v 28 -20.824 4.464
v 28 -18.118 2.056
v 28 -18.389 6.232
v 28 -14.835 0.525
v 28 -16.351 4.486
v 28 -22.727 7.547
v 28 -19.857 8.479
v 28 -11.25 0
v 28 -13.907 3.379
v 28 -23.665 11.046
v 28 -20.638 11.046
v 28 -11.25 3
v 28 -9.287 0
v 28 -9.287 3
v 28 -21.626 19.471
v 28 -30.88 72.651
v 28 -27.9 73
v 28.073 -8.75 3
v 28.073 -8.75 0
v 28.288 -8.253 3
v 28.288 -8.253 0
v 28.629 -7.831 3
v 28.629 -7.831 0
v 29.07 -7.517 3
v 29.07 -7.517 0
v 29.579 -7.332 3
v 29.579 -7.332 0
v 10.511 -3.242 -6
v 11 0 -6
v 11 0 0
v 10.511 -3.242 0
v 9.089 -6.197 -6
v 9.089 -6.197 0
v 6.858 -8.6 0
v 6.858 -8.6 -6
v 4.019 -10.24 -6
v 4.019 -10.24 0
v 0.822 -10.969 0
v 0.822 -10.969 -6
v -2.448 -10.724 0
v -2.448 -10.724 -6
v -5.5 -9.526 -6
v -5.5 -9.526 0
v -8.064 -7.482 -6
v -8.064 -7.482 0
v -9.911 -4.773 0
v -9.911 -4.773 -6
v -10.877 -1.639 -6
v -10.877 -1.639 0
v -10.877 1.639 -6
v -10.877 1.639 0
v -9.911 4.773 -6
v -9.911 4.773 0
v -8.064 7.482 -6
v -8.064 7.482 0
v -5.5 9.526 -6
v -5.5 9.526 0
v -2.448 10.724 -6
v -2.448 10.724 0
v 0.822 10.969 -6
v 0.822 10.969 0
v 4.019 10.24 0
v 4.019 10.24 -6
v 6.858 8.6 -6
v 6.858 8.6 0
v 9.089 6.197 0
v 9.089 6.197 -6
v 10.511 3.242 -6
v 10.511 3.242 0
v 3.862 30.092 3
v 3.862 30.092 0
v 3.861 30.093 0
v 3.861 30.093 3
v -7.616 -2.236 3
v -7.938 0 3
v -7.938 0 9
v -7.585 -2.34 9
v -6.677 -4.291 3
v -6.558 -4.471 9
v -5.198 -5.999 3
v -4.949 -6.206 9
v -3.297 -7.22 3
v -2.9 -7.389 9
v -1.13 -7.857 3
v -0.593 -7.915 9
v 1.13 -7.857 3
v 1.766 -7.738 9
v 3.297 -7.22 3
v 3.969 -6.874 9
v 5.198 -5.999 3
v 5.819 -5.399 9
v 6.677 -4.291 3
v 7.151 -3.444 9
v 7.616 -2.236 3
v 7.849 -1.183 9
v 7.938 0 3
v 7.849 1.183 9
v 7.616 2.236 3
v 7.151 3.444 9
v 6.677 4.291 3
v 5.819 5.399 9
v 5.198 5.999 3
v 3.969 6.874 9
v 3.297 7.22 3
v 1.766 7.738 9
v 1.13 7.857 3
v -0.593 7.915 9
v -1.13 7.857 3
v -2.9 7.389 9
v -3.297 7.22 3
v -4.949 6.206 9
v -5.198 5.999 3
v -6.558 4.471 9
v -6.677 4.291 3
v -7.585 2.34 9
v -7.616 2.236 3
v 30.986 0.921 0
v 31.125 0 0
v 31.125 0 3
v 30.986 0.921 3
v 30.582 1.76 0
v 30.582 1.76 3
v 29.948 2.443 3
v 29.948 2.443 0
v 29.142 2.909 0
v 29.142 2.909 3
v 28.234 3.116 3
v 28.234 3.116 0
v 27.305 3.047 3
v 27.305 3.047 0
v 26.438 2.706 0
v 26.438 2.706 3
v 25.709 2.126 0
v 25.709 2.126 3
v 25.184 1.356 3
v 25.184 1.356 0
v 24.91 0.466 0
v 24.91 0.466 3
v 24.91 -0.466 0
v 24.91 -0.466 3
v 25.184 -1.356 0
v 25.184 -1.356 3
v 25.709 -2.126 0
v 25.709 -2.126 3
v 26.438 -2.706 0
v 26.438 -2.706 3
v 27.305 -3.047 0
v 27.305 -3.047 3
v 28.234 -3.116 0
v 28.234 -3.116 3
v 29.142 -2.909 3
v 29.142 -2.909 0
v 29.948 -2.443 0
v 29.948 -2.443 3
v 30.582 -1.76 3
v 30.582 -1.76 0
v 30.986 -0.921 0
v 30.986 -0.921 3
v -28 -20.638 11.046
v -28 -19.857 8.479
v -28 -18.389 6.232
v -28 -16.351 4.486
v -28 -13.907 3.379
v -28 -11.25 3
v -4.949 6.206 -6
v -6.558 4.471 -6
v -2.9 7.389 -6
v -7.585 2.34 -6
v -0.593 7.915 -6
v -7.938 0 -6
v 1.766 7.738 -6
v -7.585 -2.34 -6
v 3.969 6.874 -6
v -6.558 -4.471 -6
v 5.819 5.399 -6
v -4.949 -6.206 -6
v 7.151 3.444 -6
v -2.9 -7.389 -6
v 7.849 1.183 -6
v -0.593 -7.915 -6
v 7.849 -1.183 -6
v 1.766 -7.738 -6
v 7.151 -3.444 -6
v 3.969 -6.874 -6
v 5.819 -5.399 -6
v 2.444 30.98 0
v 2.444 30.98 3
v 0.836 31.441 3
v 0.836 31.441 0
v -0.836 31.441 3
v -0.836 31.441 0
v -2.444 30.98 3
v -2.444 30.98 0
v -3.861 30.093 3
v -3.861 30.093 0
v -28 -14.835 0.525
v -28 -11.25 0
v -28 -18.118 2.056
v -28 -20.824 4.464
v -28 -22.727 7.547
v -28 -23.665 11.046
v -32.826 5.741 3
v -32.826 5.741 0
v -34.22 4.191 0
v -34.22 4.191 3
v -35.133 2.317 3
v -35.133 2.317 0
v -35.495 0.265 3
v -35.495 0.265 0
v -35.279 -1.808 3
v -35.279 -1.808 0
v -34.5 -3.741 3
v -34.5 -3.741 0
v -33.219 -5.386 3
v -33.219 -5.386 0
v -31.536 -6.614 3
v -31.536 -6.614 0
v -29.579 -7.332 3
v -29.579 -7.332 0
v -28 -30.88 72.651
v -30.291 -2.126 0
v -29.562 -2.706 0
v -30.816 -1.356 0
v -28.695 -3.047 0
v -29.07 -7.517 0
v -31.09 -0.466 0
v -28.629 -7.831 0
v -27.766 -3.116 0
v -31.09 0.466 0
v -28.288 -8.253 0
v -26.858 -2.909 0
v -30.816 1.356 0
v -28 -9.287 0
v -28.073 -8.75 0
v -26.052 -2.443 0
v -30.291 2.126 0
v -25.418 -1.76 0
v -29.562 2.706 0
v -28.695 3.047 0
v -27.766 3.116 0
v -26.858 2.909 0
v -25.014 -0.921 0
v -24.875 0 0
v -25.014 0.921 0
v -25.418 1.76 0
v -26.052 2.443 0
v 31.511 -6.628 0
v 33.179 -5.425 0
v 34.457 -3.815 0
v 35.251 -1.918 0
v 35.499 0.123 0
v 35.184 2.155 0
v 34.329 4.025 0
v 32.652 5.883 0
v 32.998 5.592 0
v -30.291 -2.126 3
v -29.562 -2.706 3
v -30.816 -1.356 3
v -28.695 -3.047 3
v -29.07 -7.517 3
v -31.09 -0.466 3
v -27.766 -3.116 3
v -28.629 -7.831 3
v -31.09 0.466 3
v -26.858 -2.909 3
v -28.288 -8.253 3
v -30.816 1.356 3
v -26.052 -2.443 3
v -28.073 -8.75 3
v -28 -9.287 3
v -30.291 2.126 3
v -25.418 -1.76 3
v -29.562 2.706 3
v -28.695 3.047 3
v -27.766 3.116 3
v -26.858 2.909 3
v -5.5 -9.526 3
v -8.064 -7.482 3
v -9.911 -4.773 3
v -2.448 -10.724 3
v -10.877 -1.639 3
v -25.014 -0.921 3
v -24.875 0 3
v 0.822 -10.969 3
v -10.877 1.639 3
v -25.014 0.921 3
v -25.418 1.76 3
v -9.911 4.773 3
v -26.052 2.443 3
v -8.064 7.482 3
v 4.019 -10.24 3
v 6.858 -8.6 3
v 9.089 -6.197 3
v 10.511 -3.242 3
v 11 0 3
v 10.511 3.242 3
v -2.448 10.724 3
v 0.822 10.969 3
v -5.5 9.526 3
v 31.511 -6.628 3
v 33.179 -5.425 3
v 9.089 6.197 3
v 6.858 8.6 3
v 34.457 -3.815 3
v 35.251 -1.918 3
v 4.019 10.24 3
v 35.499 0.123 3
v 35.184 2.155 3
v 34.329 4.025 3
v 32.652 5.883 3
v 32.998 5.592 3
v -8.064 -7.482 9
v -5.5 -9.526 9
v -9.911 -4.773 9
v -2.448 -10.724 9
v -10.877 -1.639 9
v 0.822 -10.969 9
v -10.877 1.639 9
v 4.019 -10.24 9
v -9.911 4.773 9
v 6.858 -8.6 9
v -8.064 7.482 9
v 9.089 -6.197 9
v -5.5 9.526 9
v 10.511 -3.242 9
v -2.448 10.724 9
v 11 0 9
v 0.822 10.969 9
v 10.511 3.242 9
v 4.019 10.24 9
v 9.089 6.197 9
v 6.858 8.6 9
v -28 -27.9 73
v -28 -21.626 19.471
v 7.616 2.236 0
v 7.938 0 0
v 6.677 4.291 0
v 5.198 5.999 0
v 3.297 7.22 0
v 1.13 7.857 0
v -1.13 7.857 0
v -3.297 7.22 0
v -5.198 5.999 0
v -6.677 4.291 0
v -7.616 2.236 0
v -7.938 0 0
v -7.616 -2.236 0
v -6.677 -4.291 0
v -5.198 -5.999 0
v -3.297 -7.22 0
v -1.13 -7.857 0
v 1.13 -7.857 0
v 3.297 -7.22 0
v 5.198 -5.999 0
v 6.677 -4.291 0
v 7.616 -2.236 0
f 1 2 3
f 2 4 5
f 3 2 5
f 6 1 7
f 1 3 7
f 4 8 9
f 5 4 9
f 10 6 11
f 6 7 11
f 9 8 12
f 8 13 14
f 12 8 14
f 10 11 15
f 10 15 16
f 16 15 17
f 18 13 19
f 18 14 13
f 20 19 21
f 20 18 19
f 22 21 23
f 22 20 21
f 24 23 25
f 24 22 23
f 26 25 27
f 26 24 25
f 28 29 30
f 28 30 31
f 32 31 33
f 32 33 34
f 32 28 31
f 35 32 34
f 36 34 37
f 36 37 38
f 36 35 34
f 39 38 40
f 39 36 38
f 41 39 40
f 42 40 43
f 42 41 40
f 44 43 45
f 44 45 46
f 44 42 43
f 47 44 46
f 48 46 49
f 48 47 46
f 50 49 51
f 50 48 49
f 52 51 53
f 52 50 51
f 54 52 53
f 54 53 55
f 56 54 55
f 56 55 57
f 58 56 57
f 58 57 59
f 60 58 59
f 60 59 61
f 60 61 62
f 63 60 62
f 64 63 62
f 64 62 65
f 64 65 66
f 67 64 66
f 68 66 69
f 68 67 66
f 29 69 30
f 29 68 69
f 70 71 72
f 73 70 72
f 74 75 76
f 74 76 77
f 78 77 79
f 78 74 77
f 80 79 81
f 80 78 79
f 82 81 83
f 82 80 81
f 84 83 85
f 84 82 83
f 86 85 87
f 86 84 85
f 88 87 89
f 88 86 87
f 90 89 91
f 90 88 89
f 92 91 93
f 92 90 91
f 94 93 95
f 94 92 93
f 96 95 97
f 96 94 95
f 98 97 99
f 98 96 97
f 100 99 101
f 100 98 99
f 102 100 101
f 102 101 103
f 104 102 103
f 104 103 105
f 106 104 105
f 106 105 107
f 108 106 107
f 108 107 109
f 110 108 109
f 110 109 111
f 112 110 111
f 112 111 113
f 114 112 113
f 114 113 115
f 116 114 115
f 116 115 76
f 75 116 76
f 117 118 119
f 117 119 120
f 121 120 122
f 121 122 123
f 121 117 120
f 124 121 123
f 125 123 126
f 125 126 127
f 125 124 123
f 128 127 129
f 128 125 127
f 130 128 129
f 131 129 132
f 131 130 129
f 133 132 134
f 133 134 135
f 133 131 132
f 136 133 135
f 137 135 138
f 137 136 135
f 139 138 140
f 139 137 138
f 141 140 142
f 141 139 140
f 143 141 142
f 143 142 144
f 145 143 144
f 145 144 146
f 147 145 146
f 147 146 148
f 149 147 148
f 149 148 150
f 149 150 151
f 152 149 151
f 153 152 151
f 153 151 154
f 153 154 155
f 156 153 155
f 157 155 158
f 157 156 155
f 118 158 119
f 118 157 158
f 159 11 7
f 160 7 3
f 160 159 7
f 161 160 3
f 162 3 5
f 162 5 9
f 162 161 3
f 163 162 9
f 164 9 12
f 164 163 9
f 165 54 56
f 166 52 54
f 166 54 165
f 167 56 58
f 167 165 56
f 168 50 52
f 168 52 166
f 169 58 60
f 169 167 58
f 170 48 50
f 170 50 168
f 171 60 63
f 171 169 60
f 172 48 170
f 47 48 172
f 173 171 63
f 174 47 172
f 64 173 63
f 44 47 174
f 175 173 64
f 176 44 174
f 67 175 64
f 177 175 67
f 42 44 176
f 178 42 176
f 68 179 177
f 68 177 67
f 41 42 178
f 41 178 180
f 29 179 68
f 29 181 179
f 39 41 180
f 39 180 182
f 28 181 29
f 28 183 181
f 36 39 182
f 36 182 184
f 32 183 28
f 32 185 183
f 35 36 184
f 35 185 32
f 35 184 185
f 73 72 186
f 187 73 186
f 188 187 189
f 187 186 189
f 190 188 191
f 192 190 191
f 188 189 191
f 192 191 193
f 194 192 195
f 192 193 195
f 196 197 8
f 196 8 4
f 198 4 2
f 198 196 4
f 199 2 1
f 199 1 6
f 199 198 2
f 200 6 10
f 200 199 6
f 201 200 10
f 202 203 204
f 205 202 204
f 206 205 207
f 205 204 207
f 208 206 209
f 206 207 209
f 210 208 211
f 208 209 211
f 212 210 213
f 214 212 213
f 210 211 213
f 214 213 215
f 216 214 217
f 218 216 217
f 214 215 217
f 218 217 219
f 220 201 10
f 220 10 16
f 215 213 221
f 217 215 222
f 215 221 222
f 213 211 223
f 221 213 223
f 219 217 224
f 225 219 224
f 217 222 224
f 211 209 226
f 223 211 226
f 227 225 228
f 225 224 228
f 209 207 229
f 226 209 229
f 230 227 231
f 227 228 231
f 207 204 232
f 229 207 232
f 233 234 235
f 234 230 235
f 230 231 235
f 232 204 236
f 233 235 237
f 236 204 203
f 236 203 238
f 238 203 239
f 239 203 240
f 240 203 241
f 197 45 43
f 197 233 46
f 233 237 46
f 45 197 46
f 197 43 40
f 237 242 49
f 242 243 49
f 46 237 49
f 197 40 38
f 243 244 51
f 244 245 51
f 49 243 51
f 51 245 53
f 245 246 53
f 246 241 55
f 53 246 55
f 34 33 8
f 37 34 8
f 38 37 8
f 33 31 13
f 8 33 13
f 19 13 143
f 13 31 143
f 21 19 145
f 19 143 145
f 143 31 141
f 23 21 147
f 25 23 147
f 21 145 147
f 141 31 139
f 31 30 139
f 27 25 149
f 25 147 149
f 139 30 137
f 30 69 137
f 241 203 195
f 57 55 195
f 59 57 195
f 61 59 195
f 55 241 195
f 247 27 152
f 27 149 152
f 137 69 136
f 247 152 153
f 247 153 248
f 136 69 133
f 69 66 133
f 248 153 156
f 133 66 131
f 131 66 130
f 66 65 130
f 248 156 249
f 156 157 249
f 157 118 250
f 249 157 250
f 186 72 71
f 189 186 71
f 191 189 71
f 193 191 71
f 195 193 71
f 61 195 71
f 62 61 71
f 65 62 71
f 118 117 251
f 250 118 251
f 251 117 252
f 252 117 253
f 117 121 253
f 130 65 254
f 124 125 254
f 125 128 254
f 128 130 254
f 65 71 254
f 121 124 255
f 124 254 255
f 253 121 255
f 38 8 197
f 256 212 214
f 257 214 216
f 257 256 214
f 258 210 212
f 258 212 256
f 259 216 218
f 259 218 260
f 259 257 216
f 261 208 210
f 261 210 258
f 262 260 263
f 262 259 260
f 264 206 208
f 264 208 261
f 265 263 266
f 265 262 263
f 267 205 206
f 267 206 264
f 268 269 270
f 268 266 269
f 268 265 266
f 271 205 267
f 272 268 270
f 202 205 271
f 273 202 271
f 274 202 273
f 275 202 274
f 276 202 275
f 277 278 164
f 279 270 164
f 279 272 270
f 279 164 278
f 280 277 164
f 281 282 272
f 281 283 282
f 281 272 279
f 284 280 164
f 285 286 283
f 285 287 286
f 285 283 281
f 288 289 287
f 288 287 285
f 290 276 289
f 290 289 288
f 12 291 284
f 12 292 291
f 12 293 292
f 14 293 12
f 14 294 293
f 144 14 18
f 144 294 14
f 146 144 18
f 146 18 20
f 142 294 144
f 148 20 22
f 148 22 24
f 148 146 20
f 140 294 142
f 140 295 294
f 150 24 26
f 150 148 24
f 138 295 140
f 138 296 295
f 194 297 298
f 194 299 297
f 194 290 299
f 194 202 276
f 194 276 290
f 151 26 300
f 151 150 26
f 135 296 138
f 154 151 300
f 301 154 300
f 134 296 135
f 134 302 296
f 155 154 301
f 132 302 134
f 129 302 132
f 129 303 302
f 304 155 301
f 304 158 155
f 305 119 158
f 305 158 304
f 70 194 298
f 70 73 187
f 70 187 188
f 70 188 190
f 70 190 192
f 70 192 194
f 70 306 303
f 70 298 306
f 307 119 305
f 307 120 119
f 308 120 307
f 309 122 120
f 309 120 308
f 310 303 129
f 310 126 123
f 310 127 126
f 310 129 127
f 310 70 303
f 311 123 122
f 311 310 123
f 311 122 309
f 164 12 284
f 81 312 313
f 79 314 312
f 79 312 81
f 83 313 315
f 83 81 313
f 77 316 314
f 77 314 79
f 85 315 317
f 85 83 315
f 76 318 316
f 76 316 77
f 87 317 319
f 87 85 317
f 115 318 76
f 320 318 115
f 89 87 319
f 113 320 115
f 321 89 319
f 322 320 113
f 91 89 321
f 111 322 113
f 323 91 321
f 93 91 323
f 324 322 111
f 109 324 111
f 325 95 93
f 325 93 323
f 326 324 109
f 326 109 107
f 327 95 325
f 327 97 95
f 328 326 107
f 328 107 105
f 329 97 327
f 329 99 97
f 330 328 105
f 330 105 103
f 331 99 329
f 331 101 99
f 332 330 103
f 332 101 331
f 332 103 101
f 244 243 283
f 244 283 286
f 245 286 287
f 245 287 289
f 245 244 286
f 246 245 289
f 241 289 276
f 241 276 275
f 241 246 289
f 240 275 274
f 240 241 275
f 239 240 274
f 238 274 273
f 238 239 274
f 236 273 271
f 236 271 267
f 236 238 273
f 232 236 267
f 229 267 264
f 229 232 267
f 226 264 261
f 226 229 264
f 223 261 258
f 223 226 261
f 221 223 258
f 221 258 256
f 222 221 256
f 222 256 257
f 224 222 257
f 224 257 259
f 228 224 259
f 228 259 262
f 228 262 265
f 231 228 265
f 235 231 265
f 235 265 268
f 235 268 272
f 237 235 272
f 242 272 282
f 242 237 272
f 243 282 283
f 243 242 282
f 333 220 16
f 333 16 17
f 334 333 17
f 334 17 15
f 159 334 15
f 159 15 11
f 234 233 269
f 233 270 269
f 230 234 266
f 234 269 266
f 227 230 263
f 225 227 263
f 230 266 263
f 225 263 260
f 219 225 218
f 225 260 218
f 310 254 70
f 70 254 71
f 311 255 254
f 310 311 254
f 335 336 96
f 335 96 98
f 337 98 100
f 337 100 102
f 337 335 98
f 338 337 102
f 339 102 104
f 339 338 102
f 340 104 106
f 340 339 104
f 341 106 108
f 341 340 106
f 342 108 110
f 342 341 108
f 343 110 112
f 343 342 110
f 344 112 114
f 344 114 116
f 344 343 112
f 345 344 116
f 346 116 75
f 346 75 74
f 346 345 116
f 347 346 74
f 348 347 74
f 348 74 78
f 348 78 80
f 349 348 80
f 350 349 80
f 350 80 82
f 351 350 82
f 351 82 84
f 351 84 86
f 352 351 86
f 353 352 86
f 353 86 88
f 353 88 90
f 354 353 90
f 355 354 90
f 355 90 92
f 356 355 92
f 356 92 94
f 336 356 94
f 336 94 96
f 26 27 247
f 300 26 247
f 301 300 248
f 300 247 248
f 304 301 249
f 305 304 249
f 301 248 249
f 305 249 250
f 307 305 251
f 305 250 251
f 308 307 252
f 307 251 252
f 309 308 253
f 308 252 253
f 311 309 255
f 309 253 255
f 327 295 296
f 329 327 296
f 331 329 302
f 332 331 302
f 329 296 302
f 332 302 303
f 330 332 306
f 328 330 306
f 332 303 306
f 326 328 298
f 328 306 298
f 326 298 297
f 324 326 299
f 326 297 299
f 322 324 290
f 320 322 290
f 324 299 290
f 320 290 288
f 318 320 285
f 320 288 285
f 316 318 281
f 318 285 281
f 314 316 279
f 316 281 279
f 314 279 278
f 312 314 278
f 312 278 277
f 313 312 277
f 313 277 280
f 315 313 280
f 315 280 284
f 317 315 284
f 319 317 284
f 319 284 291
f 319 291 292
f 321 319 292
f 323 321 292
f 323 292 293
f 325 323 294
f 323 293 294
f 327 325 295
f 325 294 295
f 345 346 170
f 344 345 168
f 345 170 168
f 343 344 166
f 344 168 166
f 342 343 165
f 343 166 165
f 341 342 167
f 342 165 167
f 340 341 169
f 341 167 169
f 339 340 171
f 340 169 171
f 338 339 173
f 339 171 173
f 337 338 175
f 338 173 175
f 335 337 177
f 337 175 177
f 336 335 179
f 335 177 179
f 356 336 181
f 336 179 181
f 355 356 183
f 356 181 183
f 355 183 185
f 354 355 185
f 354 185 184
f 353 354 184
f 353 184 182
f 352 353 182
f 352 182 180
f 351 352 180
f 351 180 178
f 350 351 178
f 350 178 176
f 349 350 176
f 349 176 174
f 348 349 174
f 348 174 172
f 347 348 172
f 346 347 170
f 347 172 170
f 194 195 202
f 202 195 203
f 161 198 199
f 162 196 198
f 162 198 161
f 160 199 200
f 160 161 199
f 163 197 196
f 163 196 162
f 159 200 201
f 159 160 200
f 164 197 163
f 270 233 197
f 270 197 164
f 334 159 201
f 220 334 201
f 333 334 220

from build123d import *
from build123d.topology import SkipClean

# Parameters (mm, degrees)
SKETCH2_R           = 3.125
SKETCH2_R_2         = 7.9375
BOSS_EXTRUDE2_DEPTH = 3
BOSS_EXTRUDE3_START = 6
SKETCH5_R           = 11
SKETCH5_R_2         = 7.9375
BOSS_EXTRUDE3_DEPTH = 6
SKETCH6_R           = 11
SKETCH6_R_2         = 7.9375
BOSS_EXTRUDE4_DEPTH = 6
BOSS_EXTRUDE5_DEPTH = 56
FILLET1_R           = 2


with BuildPart() as part:
    # Sketch2 → Boss-Extrude2 (new body)
    # profile 1 of 2: a face of its own
    with BuildSketch(Plane.XY):
        with BuildLine():
            ThreePointArc((3.861106297, 30.092587306), (0, 31.5), (-3.861106297, 30.092587306))
            Line((-3.861106297, 30.092587306), (-32.826382871, 5.740734133))
            ThreePointArc((-32.826382871, 5.740734133), (-35.046470961, -2.568510658), (-28, -7.5))
            Line((-28, -7.5), (-28, -11.25))
            Line((-28, -11.25), (28, -11.25))
            Line((28, -11.25), (28, -7.5))
            ThreePointArc((28, -7.5), (35.006811058, -2.674808179), (32.997833475, 5.592106988))
            Line((32.997833475, 5.592106988), (32.651575677, 5.883268116))
            Line((32.651575677, 5.883268116), (3.86193439, 30.091890979))
            Line((3.86193439, 30.091890979), (3.861106297, 30.092587306))
        make_face()
        with Locations((-28, 0)):
            Circle(SKETCH2_R, mode=Mode.SUBTRACT)
        with BuildLine():
            ThreePointArc((0, -11), (-0.700886243, -10.97764813), (-1.3989241, -10.910683359))
            ThreePointArc((-1.3989241, -10.910683359), (-7.266768019, 8.25797085), (11, 0))
            ThreePointArc((11, 0), (7.778174593, -7.778174593), (0, -11))
        make_face(mode=Mode.SUBTRACT)
        with Locations((28, 0)):
            Circle(SKETCH2_R, mode=Mode.SUBTRACT)
    # profile 2 of 2: a face of its own
    with BuildSketch(Plane.XY):
        with BuildLine():
            ThreePointArc((11, 0), (-7.266768019, 8.25797085), (-1.3989241, -10.910683359))
            ThreePointArc((-1.3989241, -10.910683359), (-0.700886243, -10.97764813), (0, -11))
            ThreePointArc((0, -11), (7.778174593, -7.778174593), (11, 0))
        make_face()
        Circle(SKETCH2_R_2, mode=Mode.SUBTRACT)
    extrude(amount=BOSS_EXTRUDE2_DEPTH)

    # Sketch5 → Boss-Extrude3 (add)
    with SkipClean():  # the faces are left unmerged after this step: merging them gives an invalid solid
        with BuildSketch(Plane(origin=(0, 0, 0), x_dir=(-1, 0, 0), z_dir=(0, 0, -1)).offset(BOSS_EXTRUDE3_START)):
            with Locations(Location((0, 0, 0), (0, 0, 180))):
                Circle(SKETCH5_R)
            Circle(SKETCH5_R_2, mode=Mode.SUBTRACT)
        extrude(amount=-BOSS_EXTRUDE3_DEPTH)

    # Sketch6 → Boss-Extrude4 (add)
    with BuildSketch(Plane.XY.offset(3)):
        Circle(SKETCH6_R)
        with Locations(Location((0, 0, 0), (0, 0, 180))):
            Circle(SKETCH6_R_2, mode=Mode.SUBTRACT)
    extrude(amount=BOSS_EXTRUDE4_DEPTH)

    # Sketch8 → Boss-Extrude5 (add)
    with BuildSketch(Plane.ZY.offset(28)):
        with BuildLine():
            Line((73, -27.9), (19.471115904, -21.625622538))
            Line((19.471115904, -21.625622538), (11.046076805, -20.638083262))
            ThreePointArc((11.046076805, -20.638083262), (5.286738936, -17.432140796), (3, -11.25))
            Line((3, -11.25), (0, -11.25))
            ThreePointArc((0, -11.25), (3.161262399, -19.558909677), (11.046076805, -23.665156356))
            Line((11.046076805, -23.665156356), (72.651058433, -30.879637525))
            Line((72.651058433, -30.879637525), (73, -27.9))
        make_face()
    extrude(amount=-BOSS_EXTRUDE5_DEPTH)

    # Fillet1
    fillet1_edges = [part.edges().sort_by_distance(p)[0] for p in [
        (-28, -7.5, 1.5),
        (28, -7.5, 1.5),
    ]]
    fillet(fillet1_edges, radius=FILLET1_R)


solid = part.part
